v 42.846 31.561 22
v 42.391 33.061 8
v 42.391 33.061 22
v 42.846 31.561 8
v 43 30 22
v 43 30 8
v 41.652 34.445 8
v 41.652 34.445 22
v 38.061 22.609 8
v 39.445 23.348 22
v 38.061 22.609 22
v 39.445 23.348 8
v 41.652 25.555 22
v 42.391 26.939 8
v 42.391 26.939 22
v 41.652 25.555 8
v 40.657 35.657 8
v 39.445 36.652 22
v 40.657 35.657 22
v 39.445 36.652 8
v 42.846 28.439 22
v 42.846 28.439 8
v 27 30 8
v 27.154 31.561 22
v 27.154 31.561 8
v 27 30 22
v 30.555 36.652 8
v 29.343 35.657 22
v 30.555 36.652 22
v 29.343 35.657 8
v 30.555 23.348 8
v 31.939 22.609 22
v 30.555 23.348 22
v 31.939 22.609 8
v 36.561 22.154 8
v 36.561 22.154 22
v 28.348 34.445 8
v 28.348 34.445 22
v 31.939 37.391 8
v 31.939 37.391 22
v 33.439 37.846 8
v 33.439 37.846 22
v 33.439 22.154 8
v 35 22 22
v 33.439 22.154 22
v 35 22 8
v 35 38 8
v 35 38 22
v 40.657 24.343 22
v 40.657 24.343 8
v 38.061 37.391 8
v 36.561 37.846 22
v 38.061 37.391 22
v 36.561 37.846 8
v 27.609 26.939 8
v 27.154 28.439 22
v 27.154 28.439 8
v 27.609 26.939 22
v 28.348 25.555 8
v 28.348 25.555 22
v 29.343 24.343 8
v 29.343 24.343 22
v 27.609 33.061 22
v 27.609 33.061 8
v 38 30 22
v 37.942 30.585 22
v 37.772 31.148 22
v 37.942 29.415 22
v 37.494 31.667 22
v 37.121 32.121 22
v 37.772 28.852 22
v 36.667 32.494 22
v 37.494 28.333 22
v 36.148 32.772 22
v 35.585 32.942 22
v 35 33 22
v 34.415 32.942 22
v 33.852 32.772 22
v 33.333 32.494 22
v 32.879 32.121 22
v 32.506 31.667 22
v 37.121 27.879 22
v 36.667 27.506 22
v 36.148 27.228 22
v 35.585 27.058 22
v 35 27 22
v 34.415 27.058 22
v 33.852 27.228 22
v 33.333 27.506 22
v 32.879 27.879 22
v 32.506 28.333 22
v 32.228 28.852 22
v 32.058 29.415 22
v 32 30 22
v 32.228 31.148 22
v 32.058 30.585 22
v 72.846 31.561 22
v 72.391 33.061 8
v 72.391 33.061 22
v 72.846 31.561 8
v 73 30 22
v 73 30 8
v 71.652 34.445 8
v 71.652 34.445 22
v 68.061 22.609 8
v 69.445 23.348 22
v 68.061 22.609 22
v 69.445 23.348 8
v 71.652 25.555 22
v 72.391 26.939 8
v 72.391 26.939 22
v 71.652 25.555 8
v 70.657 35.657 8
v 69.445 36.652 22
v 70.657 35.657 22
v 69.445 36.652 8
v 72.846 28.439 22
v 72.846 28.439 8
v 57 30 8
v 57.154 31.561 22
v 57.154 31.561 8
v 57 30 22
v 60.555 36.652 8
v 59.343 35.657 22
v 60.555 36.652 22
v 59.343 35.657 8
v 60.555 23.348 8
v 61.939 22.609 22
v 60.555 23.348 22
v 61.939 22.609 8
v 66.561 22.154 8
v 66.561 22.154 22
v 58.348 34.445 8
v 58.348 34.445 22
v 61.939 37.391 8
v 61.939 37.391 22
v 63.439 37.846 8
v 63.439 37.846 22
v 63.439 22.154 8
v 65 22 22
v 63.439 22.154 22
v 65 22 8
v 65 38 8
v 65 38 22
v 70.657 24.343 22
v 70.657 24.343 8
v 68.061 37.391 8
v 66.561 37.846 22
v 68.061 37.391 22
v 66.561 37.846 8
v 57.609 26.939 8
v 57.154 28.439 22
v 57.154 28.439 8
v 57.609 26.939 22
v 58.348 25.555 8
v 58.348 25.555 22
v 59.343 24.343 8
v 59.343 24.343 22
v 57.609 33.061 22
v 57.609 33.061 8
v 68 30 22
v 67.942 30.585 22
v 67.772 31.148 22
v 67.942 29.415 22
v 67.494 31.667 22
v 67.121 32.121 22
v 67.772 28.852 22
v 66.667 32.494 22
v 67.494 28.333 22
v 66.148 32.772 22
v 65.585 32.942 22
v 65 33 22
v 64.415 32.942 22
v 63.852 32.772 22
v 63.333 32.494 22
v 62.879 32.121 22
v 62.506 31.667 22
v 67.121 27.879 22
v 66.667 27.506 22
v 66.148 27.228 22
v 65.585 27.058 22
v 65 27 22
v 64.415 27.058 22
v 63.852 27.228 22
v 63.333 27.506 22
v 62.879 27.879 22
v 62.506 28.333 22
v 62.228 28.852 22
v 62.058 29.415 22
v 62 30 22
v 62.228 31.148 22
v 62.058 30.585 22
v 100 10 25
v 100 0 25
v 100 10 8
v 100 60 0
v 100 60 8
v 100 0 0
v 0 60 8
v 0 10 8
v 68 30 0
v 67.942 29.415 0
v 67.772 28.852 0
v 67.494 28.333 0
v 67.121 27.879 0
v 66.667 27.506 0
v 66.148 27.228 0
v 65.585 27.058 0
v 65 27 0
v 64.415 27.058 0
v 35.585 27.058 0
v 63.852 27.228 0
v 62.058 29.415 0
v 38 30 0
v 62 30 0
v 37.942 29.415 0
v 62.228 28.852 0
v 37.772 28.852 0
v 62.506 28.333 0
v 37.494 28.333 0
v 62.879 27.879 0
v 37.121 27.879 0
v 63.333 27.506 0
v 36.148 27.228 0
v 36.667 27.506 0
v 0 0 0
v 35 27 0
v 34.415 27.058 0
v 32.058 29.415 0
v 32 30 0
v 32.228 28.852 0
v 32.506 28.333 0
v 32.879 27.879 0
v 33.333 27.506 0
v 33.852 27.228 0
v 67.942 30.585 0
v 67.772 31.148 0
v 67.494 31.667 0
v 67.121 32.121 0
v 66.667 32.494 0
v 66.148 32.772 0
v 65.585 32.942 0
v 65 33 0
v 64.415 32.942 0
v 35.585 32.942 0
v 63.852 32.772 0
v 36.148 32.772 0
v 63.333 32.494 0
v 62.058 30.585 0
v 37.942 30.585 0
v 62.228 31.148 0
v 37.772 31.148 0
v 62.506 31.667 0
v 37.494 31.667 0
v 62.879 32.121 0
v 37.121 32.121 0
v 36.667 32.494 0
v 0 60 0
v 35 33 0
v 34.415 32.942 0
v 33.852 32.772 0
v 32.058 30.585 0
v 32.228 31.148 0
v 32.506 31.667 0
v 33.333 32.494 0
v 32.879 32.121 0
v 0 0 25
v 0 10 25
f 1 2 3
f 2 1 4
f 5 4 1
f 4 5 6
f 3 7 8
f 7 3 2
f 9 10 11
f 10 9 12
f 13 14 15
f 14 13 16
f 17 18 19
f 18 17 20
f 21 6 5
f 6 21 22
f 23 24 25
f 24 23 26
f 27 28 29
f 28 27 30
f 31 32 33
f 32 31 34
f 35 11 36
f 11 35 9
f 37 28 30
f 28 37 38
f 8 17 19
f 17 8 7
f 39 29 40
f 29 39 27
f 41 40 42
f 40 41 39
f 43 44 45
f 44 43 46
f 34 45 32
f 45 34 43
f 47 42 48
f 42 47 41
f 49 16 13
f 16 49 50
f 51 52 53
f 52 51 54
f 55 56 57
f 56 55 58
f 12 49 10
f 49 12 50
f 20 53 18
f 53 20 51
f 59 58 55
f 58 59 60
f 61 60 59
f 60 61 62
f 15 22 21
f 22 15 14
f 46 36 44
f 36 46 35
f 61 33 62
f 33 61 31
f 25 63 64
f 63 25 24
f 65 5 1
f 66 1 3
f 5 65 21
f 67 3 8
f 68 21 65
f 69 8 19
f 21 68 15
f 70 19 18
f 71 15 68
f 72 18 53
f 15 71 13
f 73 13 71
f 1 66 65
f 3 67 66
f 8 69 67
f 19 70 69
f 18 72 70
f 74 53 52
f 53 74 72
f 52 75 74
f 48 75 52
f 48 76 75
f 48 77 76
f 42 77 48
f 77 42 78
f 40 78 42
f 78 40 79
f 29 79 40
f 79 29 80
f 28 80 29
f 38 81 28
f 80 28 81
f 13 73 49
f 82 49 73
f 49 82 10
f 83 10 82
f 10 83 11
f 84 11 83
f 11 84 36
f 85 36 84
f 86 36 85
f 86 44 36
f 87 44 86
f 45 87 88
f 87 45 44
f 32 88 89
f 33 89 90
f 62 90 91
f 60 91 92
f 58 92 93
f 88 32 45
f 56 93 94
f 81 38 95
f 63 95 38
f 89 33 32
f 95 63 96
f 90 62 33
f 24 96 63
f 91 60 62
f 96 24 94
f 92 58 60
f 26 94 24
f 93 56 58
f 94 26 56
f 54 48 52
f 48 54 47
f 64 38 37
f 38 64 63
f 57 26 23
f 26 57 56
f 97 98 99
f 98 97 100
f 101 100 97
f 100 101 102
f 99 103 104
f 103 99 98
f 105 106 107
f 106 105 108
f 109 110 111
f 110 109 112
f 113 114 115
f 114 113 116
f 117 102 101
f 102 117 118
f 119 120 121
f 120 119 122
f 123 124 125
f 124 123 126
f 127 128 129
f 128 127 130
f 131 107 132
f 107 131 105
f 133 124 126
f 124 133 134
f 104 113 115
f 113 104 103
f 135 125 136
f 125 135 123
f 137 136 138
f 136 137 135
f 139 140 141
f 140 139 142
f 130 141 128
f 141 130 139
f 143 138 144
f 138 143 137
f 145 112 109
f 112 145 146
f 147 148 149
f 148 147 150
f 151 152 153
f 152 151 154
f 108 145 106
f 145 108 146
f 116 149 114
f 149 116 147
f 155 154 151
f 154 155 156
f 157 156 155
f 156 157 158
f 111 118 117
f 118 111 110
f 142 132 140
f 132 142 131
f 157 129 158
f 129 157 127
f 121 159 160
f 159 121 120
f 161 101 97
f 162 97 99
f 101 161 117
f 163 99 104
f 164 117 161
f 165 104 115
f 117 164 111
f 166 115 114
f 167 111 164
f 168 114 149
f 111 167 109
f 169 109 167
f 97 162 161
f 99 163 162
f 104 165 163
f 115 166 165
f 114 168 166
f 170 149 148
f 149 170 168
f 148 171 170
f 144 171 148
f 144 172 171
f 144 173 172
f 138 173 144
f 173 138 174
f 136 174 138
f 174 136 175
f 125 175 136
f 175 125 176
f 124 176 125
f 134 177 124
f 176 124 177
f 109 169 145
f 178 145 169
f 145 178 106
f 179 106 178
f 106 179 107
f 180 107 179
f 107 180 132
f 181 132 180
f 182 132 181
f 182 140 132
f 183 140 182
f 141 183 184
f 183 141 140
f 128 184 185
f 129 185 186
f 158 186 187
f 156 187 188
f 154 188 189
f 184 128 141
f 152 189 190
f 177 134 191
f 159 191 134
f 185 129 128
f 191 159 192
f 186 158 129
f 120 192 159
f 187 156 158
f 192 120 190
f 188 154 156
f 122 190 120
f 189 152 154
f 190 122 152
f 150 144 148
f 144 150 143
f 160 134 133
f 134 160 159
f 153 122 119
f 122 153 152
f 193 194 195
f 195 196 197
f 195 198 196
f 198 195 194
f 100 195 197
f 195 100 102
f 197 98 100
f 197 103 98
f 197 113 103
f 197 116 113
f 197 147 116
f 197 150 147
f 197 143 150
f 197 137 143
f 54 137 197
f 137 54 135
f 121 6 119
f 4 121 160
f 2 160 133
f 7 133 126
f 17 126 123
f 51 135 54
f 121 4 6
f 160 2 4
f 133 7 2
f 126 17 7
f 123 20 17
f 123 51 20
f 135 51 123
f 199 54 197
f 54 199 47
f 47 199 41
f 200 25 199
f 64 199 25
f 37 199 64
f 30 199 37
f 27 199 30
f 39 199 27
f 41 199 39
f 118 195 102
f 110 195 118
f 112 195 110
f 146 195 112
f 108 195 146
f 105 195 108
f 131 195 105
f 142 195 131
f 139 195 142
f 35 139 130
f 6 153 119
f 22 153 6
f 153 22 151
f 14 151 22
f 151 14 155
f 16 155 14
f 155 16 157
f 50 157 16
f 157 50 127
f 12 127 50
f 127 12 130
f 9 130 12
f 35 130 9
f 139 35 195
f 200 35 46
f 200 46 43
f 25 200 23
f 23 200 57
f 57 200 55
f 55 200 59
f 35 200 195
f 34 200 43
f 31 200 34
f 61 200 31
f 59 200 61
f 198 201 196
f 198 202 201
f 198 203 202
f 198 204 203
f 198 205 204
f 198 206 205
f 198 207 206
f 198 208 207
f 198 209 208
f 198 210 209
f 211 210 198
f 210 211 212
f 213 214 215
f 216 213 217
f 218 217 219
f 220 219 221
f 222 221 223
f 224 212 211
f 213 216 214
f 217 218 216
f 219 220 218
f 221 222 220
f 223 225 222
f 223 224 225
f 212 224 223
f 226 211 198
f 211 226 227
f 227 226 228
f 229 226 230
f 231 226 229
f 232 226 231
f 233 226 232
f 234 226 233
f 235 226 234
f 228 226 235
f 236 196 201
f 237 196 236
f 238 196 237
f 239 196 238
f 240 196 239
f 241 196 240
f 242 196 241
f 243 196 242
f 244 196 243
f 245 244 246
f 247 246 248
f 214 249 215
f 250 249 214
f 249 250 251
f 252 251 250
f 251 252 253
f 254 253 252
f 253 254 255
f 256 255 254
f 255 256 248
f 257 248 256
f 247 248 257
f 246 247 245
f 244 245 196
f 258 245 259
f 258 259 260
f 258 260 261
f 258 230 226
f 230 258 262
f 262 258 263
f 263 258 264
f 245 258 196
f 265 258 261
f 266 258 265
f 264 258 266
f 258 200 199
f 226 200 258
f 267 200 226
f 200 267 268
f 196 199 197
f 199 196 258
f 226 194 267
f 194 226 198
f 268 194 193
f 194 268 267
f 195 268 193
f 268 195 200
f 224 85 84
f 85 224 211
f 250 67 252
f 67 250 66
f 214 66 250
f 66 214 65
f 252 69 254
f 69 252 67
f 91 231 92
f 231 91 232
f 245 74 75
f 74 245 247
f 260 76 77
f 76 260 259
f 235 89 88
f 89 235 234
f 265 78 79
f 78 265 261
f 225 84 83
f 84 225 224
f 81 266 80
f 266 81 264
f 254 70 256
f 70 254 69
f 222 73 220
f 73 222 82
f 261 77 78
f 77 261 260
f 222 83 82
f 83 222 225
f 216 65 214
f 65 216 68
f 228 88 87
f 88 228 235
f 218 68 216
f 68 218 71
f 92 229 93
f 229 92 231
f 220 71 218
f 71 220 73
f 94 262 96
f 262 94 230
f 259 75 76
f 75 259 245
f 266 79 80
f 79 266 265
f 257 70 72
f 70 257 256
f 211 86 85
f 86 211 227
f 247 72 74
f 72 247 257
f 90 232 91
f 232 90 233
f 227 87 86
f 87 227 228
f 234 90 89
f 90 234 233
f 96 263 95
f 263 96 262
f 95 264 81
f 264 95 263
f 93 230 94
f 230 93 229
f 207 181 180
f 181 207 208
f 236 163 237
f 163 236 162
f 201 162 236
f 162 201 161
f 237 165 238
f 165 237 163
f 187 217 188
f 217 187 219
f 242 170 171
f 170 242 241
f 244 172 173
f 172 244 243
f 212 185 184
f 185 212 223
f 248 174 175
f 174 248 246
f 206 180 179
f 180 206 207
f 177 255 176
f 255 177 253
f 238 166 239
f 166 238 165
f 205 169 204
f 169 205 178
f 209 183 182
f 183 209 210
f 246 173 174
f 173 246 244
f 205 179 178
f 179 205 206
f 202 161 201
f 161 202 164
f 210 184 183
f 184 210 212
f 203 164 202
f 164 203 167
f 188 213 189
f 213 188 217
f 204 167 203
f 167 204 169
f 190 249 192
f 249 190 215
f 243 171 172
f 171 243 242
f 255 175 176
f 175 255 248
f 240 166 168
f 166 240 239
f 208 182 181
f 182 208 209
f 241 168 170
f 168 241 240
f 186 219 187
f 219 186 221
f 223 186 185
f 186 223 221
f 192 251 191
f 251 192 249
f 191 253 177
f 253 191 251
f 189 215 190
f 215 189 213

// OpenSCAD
$fn = 32;

// ----------------------------------------------------------------------
// Drill jig: fence jig
// ----------------------------------------------------------------------

// --- parameters (mm) ---
plate_l = 100;            // plate length, X
plate_w = 60;             // plate width, Y
plate_t = 8;              // plate thickness
boss_d = 16;              // guide boss diameter
boss_h = 15;              // boss height above the plate
guide_d = 6;              // guide hole diameter
boss_pitch = 30;          // boss pitch
fence_h = 18;             // fence height above the plate
fence_t = 10;             // fence thickness
fit_tol = 0.02;           // tolerance for press fits, mm
free_tol = 0.2;           // tolerance for clearance fits, mm

n_boss = 2;  // guide bosses
boss_x0 = (plate_l - (n_boss - 1) * boss_pitch) / 2;  // first boss X
boss_top = plate_t - 1 + boss_h;  // boss crown height
fence_top = plate_t - 1 + fence_h;  // fence crown height
total_h = max([fence_top, boss_top]);  // overall height

difference() {
  union() {
  cube([plate_l, plate_w, plate_t]);
  for (i = [0 : n_boss - 1])
    translate([boss_x0 + i * boss_pitch, plate_w / 2, plate_t - 1])
      cylinder(h = boss_h, d = boss_d);
  translate([0, 0, plate_t - 1]) cube([plate_l, fence_t, fence_h]);
  }
  for (i = [0 : n_boss - 1])
    translate([boss_x0 + i * boss_pitch, plate_w / 2, -1])
      cylinder(h = plate_t + boss_h, d = guide_d);
}
